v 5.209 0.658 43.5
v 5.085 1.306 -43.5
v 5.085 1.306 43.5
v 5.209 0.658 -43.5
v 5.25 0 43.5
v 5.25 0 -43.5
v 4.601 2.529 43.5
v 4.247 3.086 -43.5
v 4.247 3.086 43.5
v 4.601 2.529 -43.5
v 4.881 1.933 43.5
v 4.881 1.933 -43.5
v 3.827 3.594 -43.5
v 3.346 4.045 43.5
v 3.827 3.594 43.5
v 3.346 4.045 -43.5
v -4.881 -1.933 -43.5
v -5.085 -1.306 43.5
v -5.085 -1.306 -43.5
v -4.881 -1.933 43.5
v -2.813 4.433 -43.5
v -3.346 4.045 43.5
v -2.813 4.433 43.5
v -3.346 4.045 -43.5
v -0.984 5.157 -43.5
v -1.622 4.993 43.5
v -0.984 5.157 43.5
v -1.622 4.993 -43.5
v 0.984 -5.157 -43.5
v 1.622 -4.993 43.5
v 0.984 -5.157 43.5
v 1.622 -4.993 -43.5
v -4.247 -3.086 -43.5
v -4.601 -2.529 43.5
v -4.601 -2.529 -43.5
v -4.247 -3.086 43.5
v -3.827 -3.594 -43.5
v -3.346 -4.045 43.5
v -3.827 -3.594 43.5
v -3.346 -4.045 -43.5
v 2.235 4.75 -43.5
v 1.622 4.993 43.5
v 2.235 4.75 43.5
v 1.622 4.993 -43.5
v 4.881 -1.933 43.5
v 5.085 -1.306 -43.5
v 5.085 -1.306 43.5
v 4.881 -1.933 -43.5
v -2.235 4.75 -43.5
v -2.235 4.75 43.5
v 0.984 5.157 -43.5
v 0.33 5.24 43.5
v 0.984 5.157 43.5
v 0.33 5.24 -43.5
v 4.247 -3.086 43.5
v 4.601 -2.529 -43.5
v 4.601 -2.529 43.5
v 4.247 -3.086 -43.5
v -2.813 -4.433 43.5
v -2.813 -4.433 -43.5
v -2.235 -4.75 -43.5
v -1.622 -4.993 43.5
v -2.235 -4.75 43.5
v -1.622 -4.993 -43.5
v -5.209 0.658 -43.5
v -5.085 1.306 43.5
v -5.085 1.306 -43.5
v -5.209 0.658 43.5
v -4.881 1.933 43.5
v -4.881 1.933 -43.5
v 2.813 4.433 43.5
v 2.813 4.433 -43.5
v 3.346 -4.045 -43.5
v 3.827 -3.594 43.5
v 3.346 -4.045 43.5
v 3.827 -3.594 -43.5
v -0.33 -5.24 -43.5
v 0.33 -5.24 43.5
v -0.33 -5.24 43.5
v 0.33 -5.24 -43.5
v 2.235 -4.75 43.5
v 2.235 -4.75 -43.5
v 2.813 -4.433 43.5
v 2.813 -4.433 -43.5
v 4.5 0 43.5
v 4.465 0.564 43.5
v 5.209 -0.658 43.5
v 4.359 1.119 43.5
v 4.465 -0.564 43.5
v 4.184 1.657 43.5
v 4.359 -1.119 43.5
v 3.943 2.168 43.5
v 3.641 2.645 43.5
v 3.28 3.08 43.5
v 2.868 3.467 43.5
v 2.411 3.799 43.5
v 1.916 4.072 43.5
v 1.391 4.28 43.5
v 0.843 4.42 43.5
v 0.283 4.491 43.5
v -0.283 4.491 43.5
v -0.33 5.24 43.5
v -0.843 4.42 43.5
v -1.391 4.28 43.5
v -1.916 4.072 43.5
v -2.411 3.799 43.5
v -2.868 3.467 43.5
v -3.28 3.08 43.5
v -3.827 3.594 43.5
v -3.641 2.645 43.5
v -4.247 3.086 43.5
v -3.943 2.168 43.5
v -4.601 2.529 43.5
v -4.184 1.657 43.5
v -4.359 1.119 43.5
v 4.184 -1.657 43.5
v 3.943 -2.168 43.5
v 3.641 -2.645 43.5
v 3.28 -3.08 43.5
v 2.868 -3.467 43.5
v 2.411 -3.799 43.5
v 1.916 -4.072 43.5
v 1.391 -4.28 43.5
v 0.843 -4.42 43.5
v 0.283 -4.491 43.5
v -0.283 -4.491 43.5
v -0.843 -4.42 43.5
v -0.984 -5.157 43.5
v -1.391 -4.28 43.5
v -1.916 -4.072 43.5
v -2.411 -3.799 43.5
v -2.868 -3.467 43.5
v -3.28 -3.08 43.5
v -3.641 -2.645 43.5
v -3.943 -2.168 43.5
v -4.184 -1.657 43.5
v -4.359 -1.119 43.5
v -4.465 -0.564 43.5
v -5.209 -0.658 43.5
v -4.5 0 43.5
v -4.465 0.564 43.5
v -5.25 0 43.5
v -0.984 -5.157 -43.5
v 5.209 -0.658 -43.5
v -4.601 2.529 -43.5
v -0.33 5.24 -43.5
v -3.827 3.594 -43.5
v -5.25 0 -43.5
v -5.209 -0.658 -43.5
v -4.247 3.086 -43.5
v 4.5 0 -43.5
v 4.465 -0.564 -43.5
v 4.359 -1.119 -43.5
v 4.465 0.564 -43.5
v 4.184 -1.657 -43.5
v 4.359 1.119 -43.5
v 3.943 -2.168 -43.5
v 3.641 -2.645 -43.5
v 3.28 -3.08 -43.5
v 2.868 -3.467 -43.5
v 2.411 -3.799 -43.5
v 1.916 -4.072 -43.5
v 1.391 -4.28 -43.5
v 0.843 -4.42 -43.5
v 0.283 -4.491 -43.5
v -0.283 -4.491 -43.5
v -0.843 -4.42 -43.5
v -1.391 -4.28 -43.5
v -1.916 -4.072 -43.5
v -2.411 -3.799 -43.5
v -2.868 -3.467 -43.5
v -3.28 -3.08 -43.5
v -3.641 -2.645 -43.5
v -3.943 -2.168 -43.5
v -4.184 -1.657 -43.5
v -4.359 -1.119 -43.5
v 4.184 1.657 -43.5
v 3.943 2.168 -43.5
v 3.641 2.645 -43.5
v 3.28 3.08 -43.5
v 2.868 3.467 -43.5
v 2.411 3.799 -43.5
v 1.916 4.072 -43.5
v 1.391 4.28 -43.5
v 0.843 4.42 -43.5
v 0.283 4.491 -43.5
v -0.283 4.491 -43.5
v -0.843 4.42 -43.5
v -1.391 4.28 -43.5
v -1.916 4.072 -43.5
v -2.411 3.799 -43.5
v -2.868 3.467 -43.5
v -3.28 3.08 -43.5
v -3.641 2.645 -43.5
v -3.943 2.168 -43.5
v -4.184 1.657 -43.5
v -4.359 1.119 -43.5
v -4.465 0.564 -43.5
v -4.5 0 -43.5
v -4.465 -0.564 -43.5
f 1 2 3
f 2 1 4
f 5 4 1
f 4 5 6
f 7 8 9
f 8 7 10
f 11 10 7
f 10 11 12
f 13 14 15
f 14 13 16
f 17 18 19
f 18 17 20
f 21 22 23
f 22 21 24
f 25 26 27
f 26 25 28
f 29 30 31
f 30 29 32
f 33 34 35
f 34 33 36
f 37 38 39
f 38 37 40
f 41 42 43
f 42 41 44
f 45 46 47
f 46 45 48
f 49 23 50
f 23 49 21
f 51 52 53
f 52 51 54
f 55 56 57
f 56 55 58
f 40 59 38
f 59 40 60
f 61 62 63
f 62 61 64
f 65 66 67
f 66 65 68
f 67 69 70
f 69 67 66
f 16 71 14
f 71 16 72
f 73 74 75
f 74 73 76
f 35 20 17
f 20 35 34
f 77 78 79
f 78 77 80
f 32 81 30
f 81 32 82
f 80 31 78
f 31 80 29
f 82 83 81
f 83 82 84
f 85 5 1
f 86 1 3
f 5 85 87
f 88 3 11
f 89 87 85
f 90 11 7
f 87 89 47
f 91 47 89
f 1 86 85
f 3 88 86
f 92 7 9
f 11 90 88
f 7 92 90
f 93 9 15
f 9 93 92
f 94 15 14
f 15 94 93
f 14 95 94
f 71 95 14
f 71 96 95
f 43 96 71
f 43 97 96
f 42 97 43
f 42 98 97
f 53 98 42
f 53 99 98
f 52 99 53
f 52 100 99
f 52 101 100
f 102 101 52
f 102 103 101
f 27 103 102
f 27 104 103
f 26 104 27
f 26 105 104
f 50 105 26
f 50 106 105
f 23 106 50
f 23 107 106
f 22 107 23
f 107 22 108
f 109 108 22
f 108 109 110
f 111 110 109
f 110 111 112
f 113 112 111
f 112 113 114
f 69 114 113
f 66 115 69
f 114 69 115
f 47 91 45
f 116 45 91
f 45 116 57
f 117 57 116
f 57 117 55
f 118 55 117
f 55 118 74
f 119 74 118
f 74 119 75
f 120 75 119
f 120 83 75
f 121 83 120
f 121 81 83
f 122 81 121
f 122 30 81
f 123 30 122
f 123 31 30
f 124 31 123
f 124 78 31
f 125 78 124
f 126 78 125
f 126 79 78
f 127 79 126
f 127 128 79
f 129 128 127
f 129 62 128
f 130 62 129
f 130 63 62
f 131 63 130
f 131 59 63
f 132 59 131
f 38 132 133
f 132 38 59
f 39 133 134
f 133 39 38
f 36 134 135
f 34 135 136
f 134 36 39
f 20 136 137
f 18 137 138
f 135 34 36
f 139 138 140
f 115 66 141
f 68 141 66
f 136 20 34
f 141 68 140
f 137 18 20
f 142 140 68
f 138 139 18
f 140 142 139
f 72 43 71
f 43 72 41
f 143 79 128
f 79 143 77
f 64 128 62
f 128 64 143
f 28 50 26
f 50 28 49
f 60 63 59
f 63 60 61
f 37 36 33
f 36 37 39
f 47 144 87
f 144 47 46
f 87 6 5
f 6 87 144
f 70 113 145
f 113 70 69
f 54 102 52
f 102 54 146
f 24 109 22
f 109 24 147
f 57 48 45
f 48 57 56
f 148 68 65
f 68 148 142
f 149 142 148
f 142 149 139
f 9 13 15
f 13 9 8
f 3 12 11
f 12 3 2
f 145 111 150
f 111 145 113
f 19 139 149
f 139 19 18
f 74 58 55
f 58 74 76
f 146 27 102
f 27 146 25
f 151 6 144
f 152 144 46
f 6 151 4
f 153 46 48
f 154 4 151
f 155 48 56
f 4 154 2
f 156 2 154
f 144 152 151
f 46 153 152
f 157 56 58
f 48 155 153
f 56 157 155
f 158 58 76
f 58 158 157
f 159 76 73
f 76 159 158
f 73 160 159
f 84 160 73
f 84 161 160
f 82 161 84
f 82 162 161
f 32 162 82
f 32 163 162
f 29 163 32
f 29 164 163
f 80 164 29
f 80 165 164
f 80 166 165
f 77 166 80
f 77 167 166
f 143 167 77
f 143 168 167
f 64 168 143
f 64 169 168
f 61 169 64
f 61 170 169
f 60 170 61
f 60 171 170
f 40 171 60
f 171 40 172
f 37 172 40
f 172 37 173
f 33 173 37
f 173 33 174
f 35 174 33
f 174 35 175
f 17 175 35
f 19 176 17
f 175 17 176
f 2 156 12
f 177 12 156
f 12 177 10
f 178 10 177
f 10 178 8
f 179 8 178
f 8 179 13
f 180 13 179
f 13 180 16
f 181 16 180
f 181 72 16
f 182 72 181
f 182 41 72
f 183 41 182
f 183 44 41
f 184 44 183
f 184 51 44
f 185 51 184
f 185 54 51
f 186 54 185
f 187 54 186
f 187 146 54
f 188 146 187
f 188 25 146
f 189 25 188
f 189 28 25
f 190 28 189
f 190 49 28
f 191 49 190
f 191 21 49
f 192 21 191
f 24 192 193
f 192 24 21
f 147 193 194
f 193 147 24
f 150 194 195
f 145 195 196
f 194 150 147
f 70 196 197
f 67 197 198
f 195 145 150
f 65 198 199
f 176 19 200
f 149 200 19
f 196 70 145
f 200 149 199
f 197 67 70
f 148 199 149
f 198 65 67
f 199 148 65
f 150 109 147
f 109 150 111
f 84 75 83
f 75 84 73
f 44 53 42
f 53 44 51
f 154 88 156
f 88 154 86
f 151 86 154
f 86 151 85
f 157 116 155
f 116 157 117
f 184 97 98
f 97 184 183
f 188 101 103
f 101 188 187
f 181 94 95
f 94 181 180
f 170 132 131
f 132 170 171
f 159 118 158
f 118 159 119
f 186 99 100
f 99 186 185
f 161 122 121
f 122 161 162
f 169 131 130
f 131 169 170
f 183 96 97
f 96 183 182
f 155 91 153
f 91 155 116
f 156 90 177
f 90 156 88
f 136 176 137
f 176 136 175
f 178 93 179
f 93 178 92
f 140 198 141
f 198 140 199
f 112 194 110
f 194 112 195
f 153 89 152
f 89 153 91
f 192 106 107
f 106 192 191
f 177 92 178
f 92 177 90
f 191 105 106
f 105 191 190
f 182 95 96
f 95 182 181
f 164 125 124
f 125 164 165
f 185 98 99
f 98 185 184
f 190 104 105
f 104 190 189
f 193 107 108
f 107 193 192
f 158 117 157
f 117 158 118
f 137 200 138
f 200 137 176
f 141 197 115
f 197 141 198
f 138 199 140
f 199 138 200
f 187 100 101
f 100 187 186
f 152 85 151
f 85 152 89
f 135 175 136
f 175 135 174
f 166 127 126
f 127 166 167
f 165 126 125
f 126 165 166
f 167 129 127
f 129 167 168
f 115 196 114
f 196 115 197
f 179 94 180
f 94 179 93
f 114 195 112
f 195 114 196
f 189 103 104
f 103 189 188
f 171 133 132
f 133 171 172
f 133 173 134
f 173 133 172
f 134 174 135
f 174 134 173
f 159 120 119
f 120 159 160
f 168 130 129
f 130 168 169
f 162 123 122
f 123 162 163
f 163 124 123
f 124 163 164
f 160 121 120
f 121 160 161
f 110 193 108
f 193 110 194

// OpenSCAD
$fn = 50;


difference() {
	union() {
		translate(v = [0, 0, -43.5000000000]) {
			cylinder(h = 87, r = 5.2500000000);
		}
	}
	union() {
		translate(v = [0, 0, -100.0000000000]) {
			cylinder(h = 200, r = 4.5000000000);
		}
	}
}
